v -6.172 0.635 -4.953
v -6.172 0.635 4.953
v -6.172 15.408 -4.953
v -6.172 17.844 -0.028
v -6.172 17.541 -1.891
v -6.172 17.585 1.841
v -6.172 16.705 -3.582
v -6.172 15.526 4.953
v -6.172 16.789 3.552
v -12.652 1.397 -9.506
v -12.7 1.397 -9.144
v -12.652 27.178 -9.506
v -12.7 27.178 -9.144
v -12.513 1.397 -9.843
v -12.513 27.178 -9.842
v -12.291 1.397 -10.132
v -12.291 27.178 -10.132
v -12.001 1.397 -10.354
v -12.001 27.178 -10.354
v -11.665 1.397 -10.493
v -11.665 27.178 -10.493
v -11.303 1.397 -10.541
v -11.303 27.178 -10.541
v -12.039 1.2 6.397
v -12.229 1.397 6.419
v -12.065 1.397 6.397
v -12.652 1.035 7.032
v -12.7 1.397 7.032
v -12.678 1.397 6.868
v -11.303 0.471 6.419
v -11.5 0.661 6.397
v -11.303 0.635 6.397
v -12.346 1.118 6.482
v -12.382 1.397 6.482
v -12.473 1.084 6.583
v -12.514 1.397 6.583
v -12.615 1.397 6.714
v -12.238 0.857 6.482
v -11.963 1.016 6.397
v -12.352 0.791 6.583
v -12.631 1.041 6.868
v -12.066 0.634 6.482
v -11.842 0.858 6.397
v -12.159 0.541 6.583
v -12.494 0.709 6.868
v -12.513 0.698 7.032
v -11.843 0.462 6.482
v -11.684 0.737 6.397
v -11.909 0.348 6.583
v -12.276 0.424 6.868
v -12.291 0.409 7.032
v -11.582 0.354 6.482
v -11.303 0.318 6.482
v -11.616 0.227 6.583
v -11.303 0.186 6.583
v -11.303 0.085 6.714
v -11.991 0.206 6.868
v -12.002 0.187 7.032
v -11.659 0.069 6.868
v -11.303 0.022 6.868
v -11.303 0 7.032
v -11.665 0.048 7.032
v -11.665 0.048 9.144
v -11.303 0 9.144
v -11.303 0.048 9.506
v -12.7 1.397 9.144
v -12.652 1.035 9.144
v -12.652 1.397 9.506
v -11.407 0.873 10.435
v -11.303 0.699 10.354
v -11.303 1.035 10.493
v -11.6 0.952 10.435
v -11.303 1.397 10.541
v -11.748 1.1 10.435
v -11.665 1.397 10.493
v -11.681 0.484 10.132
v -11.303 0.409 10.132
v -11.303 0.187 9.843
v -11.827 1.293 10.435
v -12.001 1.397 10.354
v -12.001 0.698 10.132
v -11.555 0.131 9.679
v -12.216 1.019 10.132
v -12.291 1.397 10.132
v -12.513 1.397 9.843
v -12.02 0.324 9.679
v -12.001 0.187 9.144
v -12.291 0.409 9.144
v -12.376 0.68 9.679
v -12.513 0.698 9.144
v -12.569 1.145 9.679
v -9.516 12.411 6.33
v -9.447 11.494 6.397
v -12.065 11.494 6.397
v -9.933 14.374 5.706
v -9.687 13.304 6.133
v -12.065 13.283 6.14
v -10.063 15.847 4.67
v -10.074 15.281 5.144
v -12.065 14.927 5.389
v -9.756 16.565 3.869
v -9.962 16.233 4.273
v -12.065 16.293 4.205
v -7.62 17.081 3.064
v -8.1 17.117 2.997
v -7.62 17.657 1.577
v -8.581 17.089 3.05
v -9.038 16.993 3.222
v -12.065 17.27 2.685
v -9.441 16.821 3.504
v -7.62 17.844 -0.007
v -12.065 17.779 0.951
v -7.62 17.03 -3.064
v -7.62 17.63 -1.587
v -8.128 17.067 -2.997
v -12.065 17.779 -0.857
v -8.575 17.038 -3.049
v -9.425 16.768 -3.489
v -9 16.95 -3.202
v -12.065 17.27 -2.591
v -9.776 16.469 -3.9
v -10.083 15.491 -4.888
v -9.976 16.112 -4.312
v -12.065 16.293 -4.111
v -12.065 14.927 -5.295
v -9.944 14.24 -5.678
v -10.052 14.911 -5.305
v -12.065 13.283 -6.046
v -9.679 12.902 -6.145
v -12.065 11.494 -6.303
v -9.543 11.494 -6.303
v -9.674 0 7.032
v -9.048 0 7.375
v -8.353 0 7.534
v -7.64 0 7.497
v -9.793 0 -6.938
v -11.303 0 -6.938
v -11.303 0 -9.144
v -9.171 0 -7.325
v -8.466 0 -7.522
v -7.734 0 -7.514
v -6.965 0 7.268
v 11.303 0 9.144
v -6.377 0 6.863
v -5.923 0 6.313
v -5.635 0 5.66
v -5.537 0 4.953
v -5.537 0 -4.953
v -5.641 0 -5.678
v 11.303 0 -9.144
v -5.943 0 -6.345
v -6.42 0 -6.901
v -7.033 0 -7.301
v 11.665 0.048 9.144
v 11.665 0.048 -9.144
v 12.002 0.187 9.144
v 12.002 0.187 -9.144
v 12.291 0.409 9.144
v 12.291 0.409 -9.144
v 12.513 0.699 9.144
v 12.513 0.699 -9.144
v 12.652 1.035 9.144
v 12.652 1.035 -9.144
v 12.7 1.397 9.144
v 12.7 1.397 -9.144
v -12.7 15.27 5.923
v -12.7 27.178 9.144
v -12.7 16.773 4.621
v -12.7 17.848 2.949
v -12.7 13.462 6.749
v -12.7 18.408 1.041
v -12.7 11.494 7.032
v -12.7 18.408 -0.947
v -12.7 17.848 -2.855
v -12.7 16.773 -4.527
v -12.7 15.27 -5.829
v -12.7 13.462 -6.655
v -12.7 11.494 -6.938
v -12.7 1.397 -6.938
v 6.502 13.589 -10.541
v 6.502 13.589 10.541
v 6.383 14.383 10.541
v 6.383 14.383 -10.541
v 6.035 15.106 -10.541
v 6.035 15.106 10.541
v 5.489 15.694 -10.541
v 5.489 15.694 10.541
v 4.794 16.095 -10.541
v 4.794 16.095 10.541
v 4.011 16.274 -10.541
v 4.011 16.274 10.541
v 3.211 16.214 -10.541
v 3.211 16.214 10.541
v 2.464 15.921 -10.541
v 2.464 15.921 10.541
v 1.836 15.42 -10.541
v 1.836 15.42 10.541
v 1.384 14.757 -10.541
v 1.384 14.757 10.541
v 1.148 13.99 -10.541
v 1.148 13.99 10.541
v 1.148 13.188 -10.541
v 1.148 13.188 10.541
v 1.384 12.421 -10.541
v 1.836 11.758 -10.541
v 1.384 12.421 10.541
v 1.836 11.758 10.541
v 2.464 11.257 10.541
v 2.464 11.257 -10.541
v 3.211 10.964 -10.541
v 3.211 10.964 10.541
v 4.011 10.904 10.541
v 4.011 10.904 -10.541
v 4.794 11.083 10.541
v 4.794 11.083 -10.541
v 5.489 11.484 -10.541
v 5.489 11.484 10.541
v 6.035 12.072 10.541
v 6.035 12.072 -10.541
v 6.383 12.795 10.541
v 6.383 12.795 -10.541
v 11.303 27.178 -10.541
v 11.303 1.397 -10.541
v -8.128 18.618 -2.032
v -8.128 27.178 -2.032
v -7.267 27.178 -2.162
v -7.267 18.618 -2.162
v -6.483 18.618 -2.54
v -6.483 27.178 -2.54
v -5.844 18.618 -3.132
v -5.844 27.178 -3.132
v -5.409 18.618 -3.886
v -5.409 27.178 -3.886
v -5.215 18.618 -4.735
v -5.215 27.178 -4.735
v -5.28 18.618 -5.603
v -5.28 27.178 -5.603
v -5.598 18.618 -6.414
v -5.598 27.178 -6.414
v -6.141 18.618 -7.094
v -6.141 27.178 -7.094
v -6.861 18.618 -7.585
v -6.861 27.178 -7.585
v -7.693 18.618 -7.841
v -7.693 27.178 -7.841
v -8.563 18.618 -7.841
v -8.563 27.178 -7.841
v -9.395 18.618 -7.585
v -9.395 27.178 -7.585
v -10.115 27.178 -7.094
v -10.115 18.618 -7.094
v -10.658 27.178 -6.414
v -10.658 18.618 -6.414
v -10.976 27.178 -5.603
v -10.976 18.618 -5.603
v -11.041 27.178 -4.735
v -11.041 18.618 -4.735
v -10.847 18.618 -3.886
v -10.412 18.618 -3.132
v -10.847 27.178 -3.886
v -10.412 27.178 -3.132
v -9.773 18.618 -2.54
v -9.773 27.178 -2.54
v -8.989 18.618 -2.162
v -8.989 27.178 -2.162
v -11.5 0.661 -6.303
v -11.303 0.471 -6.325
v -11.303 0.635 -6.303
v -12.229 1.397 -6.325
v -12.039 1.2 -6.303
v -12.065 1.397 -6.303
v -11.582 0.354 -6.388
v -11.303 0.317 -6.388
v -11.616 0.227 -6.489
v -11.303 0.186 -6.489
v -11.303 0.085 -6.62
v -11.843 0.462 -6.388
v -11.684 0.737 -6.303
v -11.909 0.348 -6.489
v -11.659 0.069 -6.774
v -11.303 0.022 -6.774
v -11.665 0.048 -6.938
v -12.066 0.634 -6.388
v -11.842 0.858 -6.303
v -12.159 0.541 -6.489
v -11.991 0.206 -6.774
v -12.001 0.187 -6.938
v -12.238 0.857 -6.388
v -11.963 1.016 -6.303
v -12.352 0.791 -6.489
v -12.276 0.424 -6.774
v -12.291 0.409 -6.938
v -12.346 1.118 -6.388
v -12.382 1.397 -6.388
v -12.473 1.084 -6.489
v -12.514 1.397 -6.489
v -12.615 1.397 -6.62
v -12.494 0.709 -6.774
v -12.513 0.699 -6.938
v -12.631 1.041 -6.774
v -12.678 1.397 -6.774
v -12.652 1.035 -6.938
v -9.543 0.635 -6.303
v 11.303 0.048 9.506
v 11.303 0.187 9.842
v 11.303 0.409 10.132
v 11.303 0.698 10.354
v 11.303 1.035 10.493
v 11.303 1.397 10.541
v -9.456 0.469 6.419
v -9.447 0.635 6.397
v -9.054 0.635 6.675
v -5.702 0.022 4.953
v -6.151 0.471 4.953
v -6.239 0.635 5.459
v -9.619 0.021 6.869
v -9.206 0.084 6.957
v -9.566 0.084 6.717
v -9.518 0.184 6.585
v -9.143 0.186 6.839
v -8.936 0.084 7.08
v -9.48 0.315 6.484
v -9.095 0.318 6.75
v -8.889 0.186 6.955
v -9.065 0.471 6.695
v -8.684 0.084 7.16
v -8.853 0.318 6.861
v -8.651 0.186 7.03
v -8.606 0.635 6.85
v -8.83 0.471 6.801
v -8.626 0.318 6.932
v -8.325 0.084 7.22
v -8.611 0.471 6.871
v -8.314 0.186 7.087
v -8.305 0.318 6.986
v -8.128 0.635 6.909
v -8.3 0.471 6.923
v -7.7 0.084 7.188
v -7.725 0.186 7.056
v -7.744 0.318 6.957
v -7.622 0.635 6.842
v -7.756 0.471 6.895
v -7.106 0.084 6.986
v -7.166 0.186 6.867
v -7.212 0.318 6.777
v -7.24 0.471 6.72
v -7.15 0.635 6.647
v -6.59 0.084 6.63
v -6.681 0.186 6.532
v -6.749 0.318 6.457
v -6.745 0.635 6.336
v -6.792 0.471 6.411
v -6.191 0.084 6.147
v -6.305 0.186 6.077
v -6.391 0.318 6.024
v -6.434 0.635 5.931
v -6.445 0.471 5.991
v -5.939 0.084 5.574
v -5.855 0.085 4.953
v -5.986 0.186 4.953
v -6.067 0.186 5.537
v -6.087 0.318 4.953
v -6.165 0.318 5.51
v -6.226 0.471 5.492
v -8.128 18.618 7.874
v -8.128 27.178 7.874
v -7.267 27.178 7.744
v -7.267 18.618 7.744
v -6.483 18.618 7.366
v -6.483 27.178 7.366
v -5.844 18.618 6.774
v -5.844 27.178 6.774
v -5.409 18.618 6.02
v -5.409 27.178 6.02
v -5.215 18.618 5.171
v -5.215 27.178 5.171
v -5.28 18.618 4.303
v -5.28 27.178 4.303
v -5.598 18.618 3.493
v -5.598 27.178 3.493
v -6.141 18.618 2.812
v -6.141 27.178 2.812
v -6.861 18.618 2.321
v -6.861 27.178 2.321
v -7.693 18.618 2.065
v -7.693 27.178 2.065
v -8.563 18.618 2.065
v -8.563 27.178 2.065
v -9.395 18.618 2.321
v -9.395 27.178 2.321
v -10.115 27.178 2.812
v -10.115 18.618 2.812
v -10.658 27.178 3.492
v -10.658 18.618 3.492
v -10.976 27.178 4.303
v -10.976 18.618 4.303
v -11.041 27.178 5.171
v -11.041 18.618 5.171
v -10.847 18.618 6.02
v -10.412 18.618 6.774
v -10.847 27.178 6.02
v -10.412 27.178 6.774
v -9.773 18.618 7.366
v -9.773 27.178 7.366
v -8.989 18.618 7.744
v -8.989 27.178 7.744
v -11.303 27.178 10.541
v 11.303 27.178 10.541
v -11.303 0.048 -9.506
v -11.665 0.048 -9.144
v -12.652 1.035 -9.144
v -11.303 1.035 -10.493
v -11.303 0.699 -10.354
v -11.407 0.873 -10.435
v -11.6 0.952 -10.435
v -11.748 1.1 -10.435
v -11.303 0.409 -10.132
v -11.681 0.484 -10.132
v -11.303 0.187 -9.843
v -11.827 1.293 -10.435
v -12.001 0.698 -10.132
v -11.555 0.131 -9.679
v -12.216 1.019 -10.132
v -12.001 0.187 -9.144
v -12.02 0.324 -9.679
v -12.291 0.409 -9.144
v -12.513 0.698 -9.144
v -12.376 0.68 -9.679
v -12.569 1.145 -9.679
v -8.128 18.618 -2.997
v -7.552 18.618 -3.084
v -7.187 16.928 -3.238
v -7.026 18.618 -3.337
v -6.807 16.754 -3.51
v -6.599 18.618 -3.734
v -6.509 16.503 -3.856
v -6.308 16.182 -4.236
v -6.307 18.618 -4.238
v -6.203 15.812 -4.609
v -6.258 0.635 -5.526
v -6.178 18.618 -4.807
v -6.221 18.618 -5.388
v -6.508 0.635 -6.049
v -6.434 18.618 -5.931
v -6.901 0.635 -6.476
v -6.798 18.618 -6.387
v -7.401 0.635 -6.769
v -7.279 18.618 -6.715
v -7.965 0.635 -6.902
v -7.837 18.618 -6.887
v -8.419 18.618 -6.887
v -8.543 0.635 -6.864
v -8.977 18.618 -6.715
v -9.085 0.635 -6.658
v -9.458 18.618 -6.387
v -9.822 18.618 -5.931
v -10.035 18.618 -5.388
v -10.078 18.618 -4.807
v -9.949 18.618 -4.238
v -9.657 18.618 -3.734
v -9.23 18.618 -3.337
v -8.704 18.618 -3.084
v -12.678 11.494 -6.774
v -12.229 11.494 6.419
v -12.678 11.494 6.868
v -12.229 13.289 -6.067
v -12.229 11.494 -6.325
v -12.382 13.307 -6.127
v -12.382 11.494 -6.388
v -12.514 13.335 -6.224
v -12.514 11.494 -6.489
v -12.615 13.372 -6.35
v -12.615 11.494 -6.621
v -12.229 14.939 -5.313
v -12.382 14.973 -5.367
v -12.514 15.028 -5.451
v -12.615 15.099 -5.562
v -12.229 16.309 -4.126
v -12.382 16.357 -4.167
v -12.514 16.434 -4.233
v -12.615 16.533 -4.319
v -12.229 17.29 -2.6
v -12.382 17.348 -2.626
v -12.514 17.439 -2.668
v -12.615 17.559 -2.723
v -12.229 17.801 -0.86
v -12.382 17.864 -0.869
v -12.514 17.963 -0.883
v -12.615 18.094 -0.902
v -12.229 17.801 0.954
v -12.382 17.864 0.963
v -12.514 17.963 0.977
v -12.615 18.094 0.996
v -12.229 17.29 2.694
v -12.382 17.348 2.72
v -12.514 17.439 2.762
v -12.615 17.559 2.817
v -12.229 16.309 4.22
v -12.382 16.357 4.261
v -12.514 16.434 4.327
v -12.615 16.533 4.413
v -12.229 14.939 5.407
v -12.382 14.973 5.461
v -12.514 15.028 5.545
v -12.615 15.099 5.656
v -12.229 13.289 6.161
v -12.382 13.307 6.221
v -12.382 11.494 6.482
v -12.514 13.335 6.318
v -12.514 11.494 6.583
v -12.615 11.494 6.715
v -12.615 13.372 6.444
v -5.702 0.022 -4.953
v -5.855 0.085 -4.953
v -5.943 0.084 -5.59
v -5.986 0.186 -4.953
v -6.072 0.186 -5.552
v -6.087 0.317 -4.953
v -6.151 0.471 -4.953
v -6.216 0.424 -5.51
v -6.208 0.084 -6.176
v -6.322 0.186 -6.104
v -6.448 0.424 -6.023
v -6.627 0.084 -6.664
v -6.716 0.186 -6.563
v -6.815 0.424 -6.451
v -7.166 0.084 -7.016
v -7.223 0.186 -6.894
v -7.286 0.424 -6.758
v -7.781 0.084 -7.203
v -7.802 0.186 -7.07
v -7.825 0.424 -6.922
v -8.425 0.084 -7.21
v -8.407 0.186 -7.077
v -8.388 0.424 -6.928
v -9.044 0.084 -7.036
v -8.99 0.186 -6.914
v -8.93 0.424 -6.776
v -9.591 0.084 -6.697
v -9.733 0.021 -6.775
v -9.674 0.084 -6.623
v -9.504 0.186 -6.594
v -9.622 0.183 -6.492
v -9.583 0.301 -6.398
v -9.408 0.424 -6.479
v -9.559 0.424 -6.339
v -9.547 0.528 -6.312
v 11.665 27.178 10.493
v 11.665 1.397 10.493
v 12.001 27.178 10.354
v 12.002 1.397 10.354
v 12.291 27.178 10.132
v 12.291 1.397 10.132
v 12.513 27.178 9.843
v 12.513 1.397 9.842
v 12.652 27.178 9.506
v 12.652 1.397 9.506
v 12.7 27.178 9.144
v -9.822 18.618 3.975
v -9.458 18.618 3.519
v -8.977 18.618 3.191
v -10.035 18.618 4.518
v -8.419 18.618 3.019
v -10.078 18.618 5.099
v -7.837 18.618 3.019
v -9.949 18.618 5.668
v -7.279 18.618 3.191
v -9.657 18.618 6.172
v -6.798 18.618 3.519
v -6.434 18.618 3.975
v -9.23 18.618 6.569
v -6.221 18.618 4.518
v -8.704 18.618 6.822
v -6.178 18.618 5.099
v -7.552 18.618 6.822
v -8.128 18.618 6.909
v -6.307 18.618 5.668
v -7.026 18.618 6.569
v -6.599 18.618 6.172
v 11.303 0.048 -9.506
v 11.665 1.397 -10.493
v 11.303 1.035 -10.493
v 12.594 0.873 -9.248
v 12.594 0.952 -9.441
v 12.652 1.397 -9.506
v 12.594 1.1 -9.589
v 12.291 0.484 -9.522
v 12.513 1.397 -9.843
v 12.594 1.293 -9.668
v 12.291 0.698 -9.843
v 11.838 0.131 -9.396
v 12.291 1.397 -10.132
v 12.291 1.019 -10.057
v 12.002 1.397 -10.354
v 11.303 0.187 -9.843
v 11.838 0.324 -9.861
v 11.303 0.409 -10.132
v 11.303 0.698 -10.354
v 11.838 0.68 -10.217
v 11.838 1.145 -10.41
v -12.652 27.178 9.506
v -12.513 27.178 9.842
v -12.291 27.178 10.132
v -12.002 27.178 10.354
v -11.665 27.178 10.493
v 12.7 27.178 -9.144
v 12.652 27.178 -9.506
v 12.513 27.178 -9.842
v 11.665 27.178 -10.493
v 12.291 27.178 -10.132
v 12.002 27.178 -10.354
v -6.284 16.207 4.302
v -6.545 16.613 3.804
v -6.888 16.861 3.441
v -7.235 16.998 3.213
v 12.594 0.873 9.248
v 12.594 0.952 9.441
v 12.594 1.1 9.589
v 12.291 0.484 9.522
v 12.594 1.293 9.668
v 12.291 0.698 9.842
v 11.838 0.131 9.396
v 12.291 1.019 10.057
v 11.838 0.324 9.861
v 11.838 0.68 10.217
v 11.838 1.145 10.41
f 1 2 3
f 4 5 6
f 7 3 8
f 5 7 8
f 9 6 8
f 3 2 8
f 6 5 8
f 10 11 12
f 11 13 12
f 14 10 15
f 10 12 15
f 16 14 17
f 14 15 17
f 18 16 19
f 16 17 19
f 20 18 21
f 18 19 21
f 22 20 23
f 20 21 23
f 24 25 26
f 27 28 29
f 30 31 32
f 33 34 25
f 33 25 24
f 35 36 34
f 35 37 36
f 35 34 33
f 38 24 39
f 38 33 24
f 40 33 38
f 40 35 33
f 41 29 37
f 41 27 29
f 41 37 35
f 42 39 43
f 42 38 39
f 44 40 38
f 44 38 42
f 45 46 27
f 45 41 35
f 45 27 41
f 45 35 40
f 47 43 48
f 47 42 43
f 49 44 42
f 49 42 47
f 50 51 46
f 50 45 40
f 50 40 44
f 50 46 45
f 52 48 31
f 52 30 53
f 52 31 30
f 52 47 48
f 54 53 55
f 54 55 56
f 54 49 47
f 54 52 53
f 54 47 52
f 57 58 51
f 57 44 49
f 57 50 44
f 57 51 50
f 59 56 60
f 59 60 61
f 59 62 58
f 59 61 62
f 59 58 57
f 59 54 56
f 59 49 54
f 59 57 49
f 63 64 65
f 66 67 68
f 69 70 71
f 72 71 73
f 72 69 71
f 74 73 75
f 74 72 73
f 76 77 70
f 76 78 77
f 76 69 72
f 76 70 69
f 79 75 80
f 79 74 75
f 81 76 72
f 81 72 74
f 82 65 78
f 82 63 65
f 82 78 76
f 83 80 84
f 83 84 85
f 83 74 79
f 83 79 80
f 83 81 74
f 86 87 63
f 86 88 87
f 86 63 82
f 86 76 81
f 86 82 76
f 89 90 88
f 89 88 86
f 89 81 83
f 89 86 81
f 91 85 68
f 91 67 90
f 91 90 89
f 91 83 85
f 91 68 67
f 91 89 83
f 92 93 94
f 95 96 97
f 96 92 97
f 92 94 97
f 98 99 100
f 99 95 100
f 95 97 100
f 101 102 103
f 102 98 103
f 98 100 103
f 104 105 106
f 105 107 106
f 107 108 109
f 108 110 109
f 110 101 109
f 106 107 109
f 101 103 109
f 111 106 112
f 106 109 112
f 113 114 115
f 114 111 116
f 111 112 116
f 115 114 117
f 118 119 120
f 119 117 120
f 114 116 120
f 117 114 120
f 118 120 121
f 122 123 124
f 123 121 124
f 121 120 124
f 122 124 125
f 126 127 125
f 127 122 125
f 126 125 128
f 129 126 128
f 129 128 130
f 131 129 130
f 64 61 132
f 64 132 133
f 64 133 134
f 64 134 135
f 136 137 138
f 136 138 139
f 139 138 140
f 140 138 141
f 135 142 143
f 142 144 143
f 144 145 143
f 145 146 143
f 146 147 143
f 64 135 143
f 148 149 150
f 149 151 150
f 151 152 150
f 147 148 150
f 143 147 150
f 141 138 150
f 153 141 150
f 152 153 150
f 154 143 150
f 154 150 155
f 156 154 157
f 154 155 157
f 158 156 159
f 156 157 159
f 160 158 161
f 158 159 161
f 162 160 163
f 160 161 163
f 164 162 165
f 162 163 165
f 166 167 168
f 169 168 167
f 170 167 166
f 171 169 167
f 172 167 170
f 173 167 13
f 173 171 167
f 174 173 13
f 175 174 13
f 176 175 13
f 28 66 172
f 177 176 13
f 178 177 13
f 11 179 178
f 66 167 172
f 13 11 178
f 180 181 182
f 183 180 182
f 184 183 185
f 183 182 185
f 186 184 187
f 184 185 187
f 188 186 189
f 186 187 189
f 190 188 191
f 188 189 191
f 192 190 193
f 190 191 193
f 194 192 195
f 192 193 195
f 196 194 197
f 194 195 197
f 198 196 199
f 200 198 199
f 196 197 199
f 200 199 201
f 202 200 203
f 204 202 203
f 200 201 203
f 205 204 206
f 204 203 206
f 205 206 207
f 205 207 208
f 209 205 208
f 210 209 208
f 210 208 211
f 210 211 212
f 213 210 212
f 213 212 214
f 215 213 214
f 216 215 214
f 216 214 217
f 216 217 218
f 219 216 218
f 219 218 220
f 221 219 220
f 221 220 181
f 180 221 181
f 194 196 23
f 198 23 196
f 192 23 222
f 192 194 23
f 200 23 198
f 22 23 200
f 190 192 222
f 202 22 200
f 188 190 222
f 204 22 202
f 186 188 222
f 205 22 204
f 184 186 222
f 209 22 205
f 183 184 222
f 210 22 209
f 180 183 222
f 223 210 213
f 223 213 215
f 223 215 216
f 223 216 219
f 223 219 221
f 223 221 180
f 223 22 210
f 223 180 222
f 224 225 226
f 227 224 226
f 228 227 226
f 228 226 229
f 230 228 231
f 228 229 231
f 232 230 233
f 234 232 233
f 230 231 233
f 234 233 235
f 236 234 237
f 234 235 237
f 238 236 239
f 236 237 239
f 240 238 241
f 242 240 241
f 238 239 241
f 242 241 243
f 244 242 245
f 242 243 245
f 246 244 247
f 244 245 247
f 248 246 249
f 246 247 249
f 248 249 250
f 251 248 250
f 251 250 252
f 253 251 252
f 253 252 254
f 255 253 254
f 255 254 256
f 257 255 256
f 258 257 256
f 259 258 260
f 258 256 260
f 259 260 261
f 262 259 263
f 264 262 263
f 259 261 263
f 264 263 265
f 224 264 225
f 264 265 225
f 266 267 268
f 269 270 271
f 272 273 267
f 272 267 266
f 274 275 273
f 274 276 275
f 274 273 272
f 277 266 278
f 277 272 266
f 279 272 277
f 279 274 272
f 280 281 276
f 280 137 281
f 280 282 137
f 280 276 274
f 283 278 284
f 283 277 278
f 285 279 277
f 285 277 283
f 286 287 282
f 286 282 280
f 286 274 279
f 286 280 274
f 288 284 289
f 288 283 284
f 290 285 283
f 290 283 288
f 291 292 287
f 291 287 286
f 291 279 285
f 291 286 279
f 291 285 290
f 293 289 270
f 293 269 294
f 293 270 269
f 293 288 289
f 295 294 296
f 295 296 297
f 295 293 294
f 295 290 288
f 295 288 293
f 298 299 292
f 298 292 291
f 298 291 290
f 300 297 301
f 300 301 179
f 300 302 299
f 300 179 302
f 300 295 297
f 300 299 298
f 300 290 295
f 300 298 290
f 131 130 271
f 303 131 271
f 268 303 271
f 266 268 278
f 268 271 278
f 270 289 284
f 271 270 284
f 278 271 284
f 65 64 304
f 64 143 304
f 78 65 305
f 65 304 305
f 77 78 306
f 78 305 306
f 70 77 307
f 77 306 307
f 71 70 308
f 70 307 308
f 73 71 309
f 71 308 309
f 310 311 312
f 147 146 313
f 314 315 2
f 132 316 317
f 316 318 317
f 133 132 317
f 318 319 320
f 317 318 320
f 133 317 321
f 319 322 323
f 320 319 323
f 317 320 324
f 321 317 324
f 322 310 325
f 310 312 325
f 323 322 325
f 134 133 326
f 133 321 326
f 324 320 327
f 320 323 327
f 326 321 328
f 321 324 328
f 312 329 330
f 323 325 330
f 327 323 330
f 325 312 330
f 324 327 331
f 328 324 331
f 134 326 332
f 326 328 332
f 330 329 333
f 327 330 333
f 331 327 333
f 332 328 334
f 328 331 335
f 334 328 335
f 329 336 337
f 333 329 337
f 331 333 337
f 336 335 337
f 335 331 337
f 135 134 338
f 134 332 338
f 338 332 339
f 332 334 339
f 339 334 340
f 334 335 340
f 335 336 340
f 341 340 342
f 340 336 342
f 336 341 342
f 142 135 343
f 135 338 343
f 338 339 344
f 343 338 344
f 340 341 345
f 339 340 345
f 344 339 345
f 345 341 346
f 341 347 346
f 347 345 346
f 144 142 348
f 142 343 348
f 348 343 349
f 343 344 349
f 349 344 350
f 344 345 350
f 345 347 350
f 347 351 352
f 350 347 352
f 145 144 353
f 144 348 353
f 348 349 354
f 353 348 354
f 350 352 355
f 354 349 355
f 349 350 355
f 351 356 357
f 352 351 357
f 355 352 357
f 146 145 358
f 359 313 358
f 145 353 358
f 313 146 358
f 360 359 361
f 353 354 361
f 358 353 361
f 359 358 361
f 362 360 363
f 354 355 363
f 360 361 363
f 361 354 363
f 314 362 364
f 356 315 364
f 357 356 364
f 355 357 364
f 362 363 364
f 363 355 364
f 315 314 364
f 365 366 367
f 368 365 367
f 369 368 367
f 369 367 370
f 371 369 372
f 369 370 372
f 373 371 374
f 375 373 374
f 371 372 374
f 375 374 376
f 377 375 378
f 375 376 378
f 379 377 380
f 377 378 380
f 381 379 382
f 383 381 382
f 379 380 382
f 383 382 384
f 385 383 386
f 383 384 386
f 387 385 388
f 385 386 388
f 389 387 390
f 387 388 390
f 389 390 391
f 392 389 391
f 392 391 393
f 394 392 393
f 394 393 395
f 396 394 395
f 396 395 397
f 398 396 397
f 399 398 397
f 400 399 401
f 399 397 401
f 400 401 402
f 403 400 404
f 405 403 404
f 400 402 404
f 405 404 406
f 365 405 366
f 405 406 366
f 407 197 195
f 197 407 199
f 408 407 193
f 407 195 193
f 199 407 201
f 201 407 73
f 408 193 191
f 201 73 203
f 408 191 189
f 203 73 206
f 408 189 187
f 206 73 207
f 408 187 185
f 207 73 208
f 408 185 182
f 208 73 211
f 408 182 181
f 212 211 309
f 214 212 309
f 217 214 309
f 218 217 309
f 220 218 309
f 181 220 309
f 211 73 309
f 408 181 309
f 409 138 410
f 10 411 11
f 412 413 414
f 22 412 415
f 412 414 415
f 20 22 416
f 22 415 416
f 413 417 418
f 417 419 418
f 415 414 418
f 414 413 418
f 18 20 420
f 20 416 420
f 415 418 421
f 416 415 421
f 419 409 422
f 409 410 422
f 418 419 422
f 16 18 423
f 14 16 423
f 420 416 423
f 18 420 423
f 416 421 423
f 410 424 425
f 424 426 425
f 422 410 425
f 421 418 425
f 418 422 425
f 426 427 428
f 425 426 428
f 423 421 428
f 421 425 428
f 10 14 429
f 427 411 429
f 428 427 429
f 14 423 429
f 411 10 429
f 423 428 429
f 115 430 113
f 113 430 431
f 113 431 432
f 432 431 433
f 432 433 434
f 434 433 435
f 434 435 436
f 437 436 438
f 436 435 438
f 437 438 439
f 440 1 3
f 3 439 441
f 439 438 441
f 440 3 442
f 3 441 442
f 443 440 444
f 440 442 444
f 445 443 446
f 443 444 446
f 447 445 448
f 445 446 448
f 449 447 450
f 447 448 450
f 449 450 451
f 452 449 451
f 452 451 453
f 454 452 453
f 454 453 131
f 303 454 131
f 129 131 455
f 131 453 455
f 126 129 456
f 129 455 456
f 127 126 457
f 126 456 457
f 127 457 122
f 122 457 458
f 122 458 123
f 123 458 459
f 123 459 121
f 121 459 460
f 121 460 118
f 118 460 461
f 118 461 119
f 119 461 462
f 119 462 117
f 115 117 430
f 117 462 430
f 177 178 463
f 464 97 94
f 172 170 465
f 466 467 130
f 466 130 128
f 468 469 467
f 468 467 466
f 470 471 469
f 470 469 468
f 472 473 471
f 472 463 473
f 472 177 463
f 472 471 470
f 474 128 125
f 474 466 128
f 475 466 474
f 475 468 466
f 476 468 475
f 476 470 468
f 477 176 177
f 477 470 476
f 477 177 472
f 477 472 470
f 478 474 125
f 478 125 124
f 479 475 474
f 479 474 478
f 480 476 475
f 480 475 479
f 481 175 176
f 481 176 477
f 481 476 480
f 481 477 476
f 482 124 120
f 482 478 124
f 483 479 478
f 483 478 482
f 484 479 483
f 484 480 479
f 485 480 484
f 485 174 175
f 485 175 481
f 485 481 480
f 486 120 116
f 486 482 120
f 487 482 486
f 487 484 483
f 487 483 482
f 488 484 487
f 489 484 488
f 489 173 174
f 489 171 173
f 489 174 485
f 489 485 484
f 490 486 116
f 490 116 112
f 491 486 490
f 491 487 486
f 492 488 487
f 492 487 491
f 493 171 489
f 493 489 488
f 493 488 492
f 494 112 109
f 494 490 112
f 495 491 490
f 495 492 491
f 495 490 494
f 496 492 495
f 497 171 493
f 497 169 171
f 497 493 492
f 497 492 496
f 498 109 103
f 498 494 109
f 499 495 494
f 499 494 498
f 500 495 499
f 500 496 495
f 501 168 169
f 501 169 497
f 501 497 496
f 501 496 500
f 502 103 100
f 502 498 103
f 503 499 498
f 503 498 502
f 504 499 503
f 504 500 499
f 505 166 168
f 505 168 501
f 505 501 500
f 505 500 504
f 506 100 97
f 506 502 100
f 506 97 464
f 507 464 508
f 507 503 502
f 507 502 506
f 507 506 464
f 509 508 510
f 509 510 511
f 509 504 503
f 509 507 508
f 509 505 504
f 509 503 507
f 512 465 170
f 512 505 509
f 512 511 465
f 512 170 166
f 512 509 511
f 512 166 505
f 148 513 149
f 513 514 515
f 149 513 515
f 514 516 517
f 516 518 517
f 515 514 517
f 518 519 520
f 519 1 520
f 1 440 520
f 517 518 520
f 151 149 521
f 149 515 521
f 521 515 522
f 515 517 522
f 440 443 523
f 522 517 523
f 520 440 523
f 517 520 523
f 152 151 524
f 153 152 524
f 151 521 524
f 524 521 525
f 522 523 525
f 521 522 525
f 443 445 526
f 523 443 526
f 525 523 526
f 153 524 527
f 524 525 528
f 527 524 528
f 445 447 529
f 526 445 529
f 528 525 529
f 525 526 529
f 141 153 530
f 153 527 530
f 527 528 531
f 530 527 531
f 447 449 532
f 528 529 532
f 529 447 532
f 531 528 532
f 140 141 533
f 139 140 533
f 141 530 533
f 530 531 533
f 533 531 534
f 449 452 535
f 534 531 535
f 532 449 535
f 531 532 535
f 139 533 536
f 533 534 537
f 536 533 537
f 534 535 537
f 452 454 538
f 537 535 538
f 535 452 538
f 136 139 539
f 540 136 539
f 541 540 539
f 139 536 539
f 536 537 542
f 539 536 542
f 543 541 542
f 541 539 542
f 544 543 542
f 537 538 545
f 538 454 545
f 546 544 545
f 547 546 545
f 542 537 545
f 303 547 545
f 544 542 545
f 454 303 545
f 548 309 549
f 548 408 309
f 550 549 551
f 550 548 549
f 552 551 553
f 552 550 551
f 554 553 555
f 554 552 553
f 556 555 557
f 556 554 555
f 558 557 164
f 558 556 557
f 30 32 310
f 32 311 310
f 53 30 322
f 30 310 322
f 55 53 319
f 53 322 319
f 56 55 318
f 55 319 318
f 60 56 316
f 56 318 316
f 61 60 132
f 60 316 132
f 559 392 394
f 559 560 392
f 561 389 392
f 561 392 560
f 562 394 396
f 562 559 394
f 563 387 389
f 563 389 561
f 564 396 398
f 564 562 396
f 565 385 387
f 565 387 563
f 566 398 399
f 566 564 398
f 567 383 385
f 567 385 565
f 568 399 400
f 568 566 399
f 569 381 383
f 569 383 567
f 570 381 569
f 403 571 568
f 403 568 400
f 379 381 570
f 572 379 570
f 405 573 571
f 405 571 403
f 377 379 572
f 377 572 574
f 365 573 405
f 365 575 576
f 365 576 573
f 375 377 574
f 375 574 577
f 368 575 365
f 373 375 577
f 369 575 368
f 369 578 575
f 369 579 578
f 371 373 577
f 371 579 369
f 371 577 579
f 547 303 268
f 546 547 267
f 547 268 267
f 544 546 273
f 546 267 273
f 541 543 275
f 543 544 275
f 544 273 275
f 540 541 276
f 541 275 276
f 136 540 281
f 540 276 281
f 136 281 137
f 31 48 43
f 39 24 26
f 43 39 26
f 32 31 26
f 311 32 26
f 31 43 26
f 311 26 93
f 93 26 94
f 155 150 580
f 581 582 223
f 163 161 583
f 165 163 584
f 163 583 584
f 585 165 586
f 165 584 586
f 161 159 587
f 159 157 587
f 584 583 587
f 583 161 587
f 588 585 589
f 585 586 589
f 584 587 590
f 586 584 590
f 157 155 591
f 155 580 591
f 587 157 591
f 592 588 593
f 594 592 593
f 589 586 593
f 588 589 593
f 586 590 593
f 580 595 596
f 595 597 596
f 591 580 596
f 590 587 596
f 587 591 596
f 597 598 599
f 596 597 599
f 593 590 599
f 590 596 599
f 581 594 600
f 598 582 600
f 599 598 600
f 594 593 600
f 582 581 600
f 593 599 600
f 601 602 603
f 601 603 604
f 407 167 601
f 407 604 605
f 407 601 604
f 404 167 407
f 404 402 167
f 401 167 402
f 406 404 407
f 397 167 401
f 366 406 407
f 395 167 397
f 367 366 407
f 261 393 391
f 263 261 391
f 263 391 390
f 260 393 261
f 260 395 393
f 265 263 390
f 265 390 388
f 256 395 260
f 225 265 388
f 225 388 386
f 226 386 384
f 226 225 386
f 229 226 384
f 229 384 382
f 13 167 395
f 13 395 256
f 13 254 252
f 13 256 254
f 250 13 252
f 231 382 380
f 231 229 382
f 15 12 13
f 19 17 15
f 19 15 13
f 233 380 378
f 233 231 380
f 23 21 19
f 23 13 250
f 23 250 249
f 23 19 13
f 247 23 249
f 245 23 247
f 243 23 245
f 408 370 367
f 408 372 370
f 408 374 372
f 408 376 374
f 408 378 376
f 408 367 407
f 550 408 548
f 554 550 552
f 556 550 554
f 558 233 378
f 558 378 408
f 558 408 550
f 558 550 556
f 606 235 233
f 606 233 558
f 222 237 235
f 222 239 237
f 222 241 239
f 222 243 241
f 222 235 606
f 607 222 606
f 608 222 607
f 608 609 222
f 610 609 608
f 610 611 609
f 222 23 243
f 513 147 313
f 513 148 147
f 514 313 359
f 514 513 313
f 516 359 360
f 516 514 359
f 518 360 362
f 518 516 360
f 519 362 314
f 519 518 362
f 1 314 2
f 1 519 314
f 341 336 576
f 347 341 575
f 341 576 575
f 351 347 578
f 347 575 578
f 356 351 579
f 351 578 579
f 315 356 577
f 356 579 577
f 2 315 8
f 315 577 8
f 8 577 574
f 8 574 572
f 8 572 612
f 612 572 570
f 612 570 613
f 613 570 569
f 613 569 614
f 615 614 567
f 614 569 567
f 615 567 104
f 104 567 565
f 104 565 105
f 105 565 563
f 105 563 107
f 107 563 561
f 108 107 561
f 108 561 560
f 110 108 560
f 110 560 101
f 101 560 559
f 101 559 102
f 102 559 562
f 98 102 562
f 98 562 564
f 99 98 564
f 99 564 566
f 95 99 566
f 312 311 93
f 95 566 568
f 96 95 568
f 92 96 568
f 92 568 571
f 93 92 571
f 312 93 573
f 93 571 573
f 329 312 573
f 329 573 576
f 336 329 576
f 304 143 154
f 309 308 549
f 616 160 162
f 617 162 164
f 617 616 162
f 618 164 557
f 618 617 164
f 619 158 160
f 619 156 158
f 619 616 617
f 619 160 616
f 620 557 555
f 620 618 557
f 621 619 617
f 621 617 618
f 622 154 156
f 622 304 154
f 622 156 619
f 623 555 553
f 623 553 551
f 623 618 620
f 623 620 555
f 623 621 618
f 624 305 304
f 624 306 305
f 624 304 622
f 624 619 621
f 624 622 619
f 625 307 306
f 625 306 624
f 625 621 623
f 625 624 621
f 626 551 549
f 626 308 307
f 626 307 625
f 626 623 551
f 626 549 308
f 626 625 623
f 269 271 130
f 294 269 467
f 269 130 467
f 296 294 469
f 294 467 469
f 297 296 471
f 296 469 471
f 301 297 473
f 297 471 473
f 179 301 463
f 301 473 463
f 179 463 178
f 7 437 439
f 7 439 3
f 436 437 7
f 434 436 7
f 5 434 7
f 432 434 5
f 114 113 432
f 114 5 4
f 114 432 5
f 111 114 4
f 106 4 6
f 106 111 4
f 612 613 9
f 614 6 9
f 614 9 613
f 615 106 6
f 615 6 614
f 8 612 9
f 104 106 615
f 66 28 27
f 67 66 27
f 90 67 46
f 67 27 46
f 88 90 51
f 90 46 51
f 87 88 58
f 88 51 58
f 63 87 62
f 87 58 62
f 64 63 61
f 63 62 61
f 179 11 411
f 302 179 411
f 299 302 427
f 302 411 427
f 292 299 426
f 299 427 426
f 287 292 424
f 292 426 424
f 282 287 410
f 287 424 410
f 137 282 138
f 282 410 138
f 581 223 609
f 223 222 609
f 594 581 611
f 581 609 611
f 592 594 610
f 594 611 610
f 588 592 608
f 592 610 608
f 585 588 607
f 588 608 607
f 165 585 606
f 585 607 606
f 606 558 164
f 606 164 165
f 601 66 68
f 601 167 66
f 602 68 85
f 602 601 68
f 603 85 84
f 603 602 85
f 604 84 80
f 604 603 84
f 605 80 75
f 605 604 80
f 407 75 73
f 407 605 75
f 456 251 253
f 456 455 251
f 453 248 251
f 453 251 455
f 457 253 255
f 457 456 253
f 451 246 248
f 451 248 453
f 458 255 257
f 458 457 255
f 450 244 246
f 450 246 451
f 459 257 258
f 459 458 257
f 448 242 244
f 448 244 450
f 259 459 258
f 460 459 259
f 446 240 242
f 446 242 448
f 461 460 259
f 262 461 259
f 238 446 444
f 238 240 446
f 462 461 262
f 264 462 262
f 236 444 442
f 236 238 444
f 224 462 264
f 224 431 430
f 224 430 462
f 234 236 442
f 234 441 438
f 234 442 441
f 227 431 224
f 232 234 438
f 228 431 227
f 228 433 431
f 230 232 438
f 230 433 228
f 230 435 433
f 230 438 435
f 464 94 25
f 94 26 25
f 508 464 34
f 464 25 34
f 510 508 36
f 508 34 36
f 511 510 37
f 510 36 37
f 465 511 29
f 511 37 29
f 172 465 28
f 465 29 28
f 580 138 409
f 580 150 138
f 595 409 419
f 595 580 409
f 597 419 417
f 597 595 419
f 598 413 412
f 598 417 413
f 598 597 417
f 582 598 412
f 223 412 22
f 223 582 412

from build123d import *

# Parameters (mm, degrees)
SKETCH1_W           = 25.4
SKETCH1_H           = 21.082
BOSS_EXTRUDE1_DEPTH = 27.178
SKETCH2_R           = 2.921
CUT_EXTRUDE1_DEPTH  = 8.5598
SKETCH3_R           = 2.6924
CUT_EXTRUDE2_DEPTH  = 37.665847979
SKETCH9_R           = 1.9558
CUT_EXTRUDE4_DEPTH  = 27.178
CUT_EXTRUDE3_DEPTH  = 5.08
CUT_EXTRUDE5_START  = -7.62
CUT_EXTRUDE5_DEPTH  = 1.4478
FILLET1_R           = 1.397
FILLET2_R           = 0.635


with BuildPart() as part:
    # Sketch1 → Boss-Extrude1 (new body)
    with BuildSketch(Plane(origin=(0, 0, 0), x_dir=(1, 0, 0), z_dir=(0, 1, 0))):
        Rectangle(SKETCH1_W, SKETCH1_H)
    extrude(amount=BOSS_EXTRUDE1_DEPTH)

    # Sketch2 → Cut-Extrude1 (cut)
    with BuildSketch(Plane(origin=(0, 27.178, 0), x_dir=(1, 0, 0), z_dir=(0, 1, 0))):
        with Locations(Location((-8.128, -4.953, 0), (0, 0, 270))):
            Circle(SKETCH2_R)
        with Locations(Location((-8.128, 4.953, 0), (0, 0, 270))):
            Circle(SKETCH2_R)
    extrude(amount=-CUT_EXTRUDE1_DEPTH, mode=Mode.SUBTRACT)

    # Sketch3 → Cut-Extrude2 (cut, through all)
    with BuildSketch(Plane.XY.offset(10.541)):
        with Locations((3.81, 13.589)):
            Circle(SKETCH3_R)
    extrude(amount=-CUT_EXTRUDE2_DEPTH, mode=Mode.SUBTRACT)

    # Sketch9 → Cut-Extrude4 (cut)
    with BuildSketch(Plane(origin=(0, 27.178, 0), x_dir=(1, 0, 0), z_dir=(0, 1, 0))):
        with Locations(Location((-8.128, 4.953, 0), (0, 0, 270))):
            Circle(SKETCH9_R)
        with Locations(Location((-8.128, -4.953, 0), (0, 0, 270))):
            Circle(SKETCH9_R)
    extrude(amount=-CUT_EXTRUDE4_DEPTH, mode=Mode.SUBTRACT)

    # Sketch5 → Cut-Extrude3 (cut)
    with BuildSketch(Plane.ZY.offset(12.7)):
        with BuildLine():
            Line((-6.303, 11.494), (-6.303, 0))
            Line((-6.303, 0), (6.397, 0))
            Line((6.397, 0), (6.397, 11.494))
            ThreePointArc((6.397, 11.494), (0.047, 17.844), (-6.303, 11.494))
        make_face()
    extrude(amount=-CUT_EXTRUDE3_DEPTH, mode=Mode.SUBTRACT)

    # Cut-Extrude5: read off the stored shape, not the designer's step
    # Cut-Extrude5 outline → Cut-Extrude5 (cut)
    with BuildSketch(Plane.YZ.offset(CUT_EXTRUDE5_START)):
        with BuildLine():
            Line((15.525583312, 4.953), (0, 4.953))
            Line((0, 4.953), (0, -4.953))
            Line((0, -4.953), (15.408396505, -4.953))
            ThreePointArc((15.408396505, -4.953), (17.843555718, -0.028114492), (15.525583312, 4.953))
        make_face()
    extrude(amount=CUT_EXTRUDE5_DEPTH, mode=Mode.SUBTRACT)

    # Fillet1
    fillet1_edges = [part.edges().sort_by_distance(p)[0] for p in [
        (-12.7, 0, 8.469),
        (0, 0, 10.541),
        (-12.7, 0, -8.422),
        (0, 0, -10.541),
        (12.7, 0, 0),
        (12.7, 13.589, 10.541),
        (-12.7, 13.589, 10.541),
        (-12.7, 13.589, -10.541),
        (12.7, 13.589, -10.541),
    ]]
    fillet(fillet1_edges, radius=FILLET1_R)

    # Fillet2
    fillet2_edges = [part.edges().sort_by_distance(p)[0] for p in [
        (-7.400882257, 0, -6.768613788),
        (-10.375048641, 0, 6.397),
        (-10.423075727, 0, -6.303),
        (-12.7, 17.844, 0.047),
        (-12.7, 6.4455, -6.303),
        (-6.745040557, 0, 6.335959443),
        (-6.1722, 0, 0),
        (-12.7, 6.4455, 6.397),
        (-12.290828173, 0.409171827, -6.303),
        (-12.290828173, 0.409171827, 6.397),
    ]]
    fillet(fillet2_edges, radius=FILLET2_R)


solid = part.part
